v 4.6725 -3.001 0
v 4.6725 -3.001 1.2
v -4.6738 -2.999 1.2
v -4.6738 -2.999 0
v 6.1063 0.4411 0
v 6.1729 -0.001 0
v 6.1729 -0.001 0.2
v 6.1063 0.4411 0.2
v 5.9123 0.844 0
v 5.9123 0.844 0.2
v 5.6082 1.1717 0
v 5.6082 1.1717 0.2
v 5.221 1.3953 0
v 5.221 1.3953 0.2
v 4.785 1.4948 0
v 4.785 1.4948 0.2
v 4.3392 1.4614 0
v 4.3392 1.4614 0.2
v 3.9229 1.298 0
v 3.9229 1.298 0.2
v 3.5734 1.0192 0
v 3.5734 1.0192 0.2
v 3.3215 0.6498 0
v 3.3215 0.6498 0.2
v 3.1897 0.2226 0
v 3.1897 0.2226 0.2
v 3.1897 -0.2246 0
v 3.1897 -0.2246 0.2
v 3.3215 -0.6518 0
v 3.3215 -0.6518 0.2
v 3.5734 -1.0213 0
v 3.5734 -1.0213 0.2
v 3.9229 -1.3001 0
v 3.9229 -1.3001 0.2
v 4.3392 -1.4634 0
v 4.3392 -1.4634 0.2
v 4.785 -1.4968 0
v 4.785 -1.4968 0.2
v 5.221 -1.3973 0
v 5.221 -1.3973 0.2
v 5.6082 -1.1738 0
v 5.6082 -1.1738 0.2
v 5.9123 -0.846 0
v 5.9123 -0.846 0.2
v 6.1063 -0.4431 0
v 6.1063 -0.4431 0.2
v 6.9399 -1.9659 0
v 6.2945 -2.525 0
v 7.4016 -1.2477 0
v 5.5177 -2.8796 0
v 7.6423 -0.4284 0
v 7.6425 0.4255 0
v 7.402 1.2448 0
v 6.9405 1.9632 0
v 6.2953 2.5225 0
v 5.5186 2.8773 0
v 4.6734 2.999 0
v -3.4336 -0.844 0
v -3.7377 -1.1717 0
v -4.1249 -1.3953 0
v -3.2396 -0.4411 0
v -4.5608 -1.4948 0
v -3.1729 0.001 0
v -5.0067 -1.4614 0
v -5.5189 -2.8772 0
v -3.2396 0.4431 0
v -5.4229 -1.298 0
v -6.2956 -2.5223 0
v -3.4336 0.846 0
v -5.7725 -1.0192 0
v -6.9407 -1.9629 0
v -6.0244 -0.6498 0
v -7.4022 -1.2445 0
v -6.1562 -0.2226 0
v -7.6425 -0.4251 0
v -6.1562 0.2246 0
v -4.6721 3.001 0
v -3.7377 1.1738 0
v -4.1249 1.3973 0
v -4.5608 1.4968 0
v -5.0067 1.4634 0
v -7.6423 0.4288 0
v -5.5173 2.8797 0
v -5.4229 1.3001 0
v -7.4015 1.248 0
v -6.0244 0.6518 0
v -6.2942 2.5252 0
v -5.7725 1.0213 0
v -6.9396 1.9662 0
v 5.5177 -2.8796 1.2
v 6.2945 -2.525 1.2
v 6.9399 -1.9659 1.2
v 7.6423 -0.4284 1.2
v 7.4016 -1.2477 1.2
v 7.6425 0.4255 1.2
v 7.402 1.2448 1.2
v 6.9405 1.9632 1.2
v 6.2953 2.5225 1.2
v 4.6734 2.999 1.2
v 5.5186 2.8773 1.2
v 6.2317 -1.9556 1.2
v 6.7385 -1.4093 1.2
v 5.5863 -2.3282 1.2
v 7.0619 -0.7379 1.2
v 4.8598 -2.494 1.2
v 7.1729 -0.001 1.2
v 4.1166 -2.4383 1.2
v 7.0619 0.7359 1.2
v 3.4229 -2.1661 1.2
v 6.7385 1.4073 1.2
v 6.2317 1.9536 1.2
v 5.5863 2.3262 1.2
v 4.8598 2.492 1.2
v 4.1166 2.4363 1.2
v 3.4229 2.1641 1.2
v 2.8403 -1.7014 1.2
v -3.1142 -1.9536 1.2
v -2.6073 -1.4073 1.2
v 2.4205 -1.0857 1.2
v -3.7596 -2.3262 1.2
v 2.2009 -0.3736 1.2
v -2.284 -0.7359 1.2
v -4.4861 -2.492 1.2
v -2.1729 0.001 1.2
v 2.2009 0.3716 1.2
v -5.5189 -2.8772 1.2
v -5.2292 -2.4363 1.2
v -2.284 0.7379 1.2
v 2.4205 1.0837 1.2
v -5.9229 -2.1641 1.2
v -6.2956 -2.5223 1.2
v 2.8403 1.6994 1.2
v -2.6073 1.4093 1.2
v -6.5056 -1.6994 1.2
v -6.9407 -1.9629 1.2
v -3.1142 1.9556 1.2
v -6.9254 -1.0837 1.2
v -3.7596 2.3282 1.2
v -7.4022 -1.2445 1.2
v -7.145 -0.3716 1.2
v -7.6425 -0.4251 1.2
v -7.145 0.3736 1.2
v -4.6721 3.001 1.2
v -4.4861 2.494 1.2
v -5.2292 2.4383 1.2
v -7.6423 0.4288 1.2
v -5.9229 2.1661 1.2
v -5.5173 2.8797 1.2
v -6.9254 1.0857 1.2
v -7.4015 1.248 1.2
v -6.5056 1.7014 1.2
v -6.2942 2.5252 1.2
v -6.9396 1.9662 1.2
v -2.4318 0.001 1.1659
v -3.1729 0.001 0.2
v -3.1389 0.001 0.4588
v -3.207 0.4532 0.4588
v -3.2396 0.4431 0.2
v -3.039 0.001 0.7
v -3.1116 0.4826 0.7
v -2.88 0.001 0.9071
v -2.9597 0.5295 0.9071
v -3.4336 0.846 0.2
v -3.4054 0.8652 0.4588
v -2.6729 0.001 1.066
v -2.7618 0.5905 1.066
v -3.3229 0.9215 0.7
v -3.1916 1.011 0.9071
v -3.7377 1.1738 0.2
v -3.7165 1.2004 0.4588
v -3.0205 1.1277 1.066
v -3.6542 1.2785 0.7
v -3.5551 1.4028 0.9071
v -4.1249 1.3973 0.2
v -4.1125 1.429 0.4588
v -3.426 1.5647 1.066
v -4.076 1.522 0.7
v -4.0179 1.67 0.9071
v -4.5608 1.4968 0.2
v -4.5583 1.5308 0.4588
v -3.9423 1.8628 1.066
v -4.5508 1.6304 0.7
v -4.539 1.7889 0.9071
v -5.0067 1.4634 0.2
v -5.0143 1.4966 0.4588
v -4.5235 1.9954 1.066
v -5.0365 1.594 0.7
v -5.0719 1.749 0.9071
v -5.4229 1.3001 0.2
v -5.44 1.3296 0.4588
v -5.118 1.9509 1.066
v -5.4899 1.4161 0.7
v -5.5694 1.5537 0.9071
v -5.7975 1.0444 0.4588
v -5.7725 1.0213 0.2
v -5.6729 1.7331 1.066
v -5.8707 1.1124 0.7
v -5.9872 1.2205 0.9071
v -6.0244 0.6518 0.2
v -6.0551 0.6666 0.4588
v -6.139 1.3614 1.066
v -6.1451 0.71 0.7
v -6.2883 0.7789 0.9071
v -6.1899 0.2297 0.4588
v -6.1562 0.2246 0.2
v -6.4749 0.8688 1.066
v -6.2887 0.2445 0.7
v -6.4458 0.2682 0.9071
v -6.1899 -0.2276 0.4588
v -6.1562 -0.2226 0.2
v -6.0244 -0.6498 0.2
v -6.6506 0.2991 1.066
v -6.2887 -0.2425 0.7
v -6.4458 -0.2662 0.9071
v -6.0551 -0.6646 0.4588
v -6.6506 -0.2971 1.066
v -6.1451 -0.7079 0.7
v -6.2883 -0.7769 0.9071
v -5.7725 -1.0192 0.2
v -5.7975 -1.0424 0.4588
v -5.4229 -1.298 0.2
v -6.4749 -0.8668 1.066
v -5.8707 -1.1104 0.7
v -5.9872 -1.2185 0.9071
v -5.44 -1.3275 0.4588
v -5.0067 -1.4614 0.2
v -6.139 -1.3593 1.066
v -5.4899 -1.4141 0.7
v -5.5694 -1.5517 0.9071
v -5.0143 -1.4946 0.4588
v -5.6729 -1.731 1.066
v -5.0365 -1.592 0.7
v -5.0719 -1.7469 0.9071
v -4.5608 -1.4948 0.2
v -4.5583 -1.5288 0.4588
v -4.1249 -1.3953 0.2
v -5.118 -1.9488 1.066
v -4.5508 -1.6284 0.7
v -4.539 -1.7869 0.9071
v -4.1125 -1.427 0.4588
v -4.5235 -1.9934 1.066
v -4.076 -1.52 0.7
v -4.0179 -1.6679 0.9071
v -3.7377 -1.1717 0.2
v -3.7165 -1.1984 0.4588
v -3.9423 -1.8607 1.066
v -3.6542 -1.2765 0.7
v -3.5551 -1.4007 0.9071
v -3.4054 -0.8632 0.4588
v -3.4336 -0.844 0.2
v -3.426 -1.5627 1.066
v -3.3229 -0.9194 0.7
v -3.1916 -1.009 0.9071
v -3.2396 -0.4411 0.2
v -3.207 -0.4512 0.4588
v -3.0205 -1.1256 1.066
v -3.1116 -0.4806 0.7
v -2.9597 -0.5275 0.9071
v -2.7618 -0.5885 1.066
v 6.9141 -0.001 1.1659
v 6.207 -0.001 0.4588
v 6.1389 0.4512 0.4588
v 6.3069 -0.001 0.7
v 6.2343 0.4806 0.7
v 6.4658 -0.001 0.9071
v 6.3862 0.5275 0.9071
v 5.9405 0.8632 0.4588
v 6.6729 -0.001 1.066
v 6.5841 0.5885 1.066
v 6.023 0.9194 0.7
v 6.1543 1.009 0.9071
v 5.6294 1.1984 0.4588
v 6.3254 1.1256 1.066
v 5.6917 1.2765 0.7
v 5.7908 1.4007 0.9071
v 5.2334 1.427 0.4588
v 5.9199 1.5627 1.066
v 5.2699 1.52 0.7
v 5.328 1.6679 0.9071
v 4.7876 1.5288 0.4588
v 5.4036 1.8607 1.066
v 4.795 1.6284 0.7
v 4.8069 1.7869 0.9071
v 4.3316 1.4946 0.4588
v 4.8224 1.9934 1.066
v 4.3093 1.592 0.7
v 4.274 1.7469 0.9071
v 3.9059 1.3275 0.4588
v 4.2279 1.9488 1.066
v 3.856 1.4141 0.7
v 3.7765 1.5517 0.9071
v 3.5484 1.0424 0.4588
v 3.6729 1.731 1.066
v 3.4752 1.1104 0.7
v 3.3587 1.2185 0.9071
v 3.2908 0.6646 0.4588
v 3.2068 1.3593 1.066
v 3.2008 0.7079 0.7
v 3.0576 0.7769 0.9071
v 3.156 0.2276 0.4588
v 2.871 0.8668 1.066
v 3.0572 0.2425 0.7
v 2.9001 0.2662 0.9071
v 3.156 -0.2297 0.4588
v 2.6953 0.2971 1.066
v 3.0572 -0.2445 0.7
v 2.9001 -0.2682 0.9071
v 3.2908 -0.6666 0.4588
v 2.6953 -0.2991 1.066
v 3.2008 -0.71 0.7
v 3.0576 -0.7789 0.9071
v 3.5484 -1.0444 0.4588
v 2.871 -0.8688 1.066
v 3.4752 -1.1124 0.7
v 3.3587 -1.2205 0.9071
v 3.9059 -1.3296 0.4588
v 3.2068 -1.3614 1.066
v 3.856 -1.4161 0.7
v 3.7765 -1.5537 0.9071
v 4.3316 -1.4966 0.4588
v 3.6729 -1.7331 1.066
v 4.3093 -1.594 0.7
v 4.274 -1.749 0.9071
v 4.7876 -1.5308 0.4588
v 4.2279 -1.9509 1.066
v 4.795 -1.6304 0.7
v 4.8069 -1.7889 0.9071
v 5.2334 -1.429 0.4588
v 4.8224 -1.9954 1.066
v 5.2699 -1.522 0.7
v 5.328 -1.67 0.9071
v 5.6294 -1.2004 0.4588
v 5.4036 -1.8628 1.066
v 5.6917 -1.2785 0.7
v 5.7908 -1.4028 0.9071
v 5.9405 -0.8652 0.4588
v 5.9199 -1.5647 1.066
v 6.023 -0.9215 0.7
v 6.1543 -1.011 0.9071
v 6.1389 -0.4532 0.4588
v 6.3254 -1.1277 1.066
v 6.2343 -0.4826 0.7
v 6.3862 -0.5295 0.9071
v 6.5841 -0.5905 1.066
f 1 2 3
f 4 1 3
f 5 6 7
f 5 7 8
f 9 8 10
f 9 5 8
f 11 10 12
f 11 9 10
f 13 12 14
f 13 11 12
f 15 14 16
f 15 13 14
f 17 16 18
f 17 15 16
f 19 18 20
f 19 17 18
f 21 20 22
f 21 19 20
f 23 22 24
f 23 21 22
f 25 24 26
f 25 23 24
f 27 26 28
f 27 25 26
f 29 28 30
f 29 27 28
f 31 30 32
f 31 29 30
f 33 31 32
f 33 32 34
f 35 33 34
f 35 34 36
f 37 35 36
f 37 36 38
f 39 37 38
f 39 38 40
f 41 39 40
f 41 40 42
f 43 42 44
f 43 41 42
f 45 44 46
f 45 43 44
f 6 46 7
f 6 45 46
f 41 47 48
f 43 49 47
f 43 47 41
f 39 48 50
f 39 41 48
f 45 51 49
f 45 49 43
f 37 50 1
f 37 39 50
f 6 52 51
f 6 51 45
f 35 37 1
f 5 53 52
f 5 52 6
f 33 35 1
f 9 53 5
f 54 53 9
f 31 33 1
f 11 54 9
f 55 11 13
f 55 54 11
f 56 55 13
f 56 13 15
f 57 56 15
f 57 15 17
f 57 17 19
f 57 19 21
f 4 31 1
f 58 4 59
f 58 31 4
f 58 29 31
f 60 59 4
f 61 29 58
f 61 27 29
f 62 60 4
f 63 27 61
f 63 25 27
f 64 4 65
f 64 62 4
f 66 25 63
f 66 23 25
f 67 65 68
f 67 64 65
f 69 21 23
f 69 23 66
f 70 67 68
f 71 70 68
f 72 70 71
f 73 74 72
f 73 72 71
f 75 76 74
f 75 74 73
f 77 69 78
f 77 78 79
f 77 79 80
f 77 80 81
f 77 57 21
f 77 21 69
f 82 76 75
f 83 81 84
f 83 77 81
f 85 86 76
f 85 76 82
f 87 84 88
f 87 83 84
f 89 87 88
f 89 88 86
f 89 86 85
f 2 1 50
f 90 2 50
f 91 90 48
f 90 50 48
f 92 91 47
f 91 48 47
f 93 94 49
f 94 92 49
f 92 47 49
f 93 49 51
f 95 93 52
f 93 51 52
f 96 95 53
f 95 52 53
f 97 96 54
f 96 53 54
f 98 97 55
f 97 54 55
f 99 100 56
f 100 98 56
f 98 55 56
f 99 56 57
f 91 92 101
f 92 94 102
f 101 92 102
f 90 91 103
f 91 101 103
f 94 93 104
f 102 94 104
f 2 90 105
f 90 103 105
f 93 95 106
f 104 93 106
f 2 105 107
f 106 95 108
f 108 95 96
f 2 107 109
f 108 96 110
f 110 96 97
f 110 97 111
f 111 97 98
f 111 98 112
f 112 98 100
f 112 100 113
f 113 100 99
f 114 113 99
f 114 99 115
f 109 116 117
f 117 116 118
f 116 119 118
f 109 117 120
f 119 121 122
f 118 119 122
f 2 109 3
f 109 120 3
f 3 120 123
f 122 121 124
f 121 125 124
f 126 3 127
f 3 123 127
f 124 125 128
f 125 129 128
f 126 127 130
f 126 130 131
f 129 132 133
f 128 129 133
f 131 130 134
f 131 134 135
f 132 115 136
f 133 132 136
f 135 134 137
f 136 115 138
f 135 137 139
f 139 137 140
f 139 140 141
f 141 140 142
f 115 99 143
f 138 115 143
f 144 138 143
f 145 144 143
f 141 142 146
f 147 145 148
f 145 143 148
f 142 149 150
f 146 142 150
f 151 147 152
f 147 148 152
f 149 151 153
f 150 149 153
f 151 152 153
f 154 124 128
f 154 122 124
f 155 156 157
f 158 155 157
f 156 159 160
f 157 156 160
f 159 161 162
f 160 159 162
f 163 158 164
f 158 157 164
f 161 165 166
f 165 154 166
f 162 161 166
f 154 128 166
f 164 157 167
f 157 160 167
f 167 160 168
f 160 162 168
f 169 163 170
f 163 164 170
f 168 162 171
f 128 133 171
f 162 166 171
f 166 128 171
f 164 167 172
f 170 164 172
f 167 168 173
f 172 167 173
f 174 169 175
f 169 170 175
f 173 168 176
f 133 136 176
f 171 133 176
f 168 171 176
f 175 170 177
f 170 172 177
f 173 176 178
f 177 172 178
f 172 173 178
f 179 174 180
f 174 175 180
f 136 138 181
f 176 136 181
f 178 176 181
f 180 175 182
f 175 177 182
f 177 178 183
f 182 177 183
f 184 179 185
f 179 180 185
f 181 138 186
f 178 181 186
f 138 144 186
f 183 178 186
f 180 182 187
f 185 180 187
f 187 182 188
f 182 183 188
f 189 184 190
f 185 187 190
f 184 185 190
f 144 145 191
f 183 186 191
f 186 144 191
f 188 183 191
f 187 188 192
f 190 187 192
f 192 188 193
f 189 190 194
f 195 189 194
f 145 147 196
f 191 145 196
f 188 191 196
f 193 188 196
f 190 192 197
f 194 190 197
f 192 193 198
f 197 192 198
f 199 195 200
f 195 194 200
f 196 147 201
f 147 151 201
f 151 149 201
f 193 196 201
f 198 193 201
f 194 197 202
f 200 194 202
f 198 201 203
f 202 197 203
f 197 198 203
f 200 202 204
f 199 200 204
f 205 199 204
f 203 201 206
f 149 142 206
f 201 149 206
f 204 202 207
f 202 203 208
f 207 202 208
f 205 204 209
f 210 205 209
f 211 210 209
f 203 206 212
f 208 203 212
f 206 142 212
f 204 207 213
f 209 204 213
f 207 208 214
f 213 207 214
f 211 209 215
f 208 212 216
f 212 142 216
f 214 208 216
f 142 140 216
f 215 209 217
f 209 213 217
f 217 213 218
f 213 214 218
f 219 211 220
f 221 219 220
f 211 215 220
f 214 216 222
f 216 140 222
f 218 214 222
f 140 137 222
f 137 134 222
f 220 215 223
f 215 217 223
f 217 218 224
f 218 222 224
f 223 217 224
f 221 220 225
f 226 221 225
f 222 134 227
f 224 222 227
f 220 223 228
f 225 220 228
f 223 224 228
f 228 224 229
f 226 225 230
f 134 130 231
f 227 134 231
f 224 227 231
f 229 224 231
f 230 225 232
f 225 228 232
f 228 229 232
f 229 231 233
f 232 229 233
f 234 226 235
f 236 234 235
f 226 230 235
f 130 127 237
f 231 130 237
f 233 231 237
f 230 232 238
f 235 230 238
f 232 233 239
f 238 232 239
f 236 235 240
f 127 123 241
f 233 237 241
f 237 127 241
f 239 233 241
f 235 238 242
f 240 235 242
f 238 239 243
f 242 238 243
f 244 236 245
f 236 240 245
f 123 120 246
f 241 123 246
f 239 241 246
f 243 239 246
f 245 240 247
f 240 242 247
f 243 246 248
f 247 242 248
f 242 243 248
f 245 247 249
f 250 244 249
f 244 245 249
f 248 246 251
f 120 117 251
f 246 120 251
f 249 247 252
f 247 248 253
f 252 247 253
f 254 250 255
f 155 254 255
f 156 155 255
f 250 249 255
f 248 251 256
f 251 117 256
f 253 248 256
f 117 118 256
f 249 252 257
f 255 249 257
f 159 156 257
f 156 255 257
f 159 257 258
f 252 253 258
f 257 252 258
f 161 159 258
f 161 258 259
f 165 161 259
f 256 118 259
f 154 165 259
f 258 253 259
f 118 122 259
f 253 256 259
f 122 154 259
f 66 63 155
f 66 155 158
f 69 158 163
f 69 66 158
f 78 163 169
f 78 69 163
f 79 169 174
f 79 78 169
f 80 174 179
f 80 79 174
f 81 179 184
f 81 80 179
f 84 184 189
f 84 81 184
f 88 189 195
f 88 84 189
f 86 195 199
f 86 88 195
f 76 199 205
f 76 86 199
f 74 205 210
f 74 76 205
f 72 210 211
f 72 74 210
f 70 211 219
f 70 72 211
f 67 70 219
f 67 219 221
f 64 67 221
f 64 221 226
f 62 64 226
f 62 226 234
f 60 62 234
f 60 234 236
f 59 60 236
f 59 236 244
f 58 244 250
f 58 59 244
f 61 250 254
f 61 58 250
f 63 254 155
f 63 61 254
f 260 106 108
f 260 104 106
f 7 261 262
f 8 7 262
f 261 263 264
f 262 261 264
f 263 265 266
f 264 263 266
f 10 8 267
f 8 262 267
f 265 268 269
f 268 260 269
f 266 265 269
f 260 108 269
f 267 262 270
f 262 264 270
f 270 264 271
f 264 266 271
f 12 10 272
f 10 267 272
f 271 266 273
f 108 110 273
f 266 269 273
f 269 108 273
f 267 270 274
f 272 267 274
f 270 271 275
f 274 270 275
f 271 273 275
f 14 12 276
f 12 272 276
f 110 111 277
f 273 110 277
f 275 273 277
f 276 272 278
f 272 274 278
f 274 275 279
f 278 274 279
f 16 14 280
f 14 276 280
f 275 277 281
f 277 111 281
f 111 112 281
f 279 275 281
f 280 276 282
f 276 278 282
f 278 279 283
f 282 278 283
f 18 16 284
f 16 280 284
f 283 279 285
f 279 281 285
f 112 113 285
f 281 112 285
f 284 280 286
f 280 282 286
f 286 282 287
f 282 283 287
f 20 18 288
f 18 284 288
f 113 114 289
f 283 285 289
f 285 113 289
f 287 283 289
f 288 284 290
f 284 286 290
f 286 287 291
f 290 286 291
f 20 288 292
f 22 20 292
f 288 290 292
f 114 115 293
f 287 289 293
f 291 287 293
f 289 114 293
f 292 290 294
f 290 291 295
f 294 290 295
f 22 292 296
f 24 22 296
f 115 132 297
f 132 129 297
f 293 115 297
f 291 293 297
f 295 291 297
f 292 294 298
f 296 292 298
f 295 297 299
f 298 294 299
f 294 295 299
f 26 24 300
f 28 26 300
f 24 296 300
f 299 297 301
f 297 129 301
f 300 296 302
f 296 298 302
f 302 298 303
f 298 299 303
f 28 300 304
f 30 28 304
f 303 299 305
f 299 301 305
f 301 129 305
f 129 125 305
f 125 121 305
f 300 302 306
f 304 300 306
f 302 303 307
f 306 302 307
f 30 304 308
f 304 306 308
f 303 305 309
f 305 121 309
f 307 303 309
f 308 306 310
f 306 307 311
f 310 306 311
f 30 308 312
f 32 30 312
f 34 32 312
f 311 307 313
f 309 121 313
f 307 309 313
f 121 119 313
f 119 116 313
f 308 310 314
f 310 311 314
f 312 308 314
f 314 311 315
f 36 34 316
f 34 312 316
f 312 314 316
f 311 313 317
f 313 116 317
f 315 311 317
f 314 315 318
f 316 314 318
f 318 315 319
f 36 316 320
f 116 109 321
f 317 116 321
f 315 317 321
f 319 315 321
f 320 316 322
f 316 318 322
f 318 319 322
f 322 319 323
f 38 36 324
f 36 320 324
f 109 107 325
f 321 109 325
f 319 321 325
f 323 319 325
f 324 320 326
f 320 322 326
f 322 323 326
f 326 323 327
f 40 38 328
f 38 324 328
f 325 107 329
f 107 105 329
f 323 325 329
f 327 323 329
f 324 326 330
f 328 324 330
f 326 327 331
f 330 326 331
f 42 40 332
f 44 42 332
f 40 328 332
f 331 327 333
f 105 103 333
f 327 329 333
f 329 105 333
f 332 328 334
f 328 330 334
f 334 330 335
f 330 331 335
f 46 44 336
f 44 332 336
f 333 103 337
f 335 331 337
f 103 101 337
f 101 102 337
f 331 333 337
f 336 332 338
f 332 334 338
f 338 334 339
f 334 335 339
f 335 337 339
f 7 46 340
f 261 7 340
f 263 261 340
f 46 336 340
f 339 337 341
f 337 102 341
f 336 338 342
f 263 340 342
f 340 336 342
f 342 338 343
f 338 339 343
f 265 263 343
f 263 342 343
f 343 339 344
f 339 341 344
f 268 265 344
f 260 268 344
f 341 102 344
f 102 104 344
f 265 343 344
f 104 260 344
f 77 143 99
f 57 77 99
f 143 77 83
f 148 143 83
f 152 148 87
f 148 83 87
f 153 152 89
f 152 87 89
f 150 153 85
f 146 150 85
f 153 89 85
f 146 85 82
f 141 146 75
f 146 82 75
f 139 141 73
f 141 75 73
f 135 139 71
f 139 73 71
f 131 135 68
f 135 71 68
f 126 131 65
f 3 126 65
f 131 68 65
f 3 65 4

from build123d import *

# Parameters (mm, degrees)
SKETCH_1_R        = 3
SKETCH_1_R_2      = 1.5
EXTRUDE_1_DEPTH   = 1.2
EXTRUDE_1_2_DEPTH = 1.2
EXTRUDE_2_DEPTH   = 1.2
FILLET_1_R        = 1


with BuildPart() as part:
    # Sketch 1 → Extrude 1 (new body)
    with BuildSketch(Plane.XY):
        with Locations((-4.672939719, 0.001012373)):
            Circle(SKETCH_1_R)
        with Locations((-4.672939719, 0.001012373)):
            Circle(SKETCH_1_R_2, mode=Mode.SUBTRACT)
    extrude(amount=EXTRUDE_1_DEPTH)



with BuildPart() as body_2:
    # Sketch 1 → Extrude 1 2 (new body)
    with BuildSketch(Plane.XY):
        with Locations((4.672939719, -0.001012373)):
            Circle(SKETCH_1_R)
        with Locations((4.672939719, -0.001012373)):
            Circle(SKETCH_1_R_2, mode=Mode.SUBTRACT)
    extrude(amount=EXTRUDE_1_2_DEPTH)


with BuildPart() as part_1:
    add(part.part)

    add(body_2.part)  # Extrude 2 merges body 2
    # Sketch 2 → Extrude 2 (add)
    with BuildSketch(Plane.XY.offset(1.2)):
        Polygon((-4.672103484, 3.001012257), (4.673403359, 2.998987591), (1.672939725, -0.001203708), (4.672476078, -3.001012337), (-4.673775953, -2.99898751), (-1.672939772, 0.001576302), align=None)
    extrude(amount=-EXTRUDE_2_DEPTH)

    # Fillet 1
    fillet_1_edges = [part_1.edges().sort_by_distance(p)[0] for p in [
        (3.172939719, -0.001012373, 1.2),
        (-6.172939719, 0.001012373, 1.2),
    ]]
    fillet(fillet_1_edges, radius=FILLET_1_R)


solid = part_1.part
